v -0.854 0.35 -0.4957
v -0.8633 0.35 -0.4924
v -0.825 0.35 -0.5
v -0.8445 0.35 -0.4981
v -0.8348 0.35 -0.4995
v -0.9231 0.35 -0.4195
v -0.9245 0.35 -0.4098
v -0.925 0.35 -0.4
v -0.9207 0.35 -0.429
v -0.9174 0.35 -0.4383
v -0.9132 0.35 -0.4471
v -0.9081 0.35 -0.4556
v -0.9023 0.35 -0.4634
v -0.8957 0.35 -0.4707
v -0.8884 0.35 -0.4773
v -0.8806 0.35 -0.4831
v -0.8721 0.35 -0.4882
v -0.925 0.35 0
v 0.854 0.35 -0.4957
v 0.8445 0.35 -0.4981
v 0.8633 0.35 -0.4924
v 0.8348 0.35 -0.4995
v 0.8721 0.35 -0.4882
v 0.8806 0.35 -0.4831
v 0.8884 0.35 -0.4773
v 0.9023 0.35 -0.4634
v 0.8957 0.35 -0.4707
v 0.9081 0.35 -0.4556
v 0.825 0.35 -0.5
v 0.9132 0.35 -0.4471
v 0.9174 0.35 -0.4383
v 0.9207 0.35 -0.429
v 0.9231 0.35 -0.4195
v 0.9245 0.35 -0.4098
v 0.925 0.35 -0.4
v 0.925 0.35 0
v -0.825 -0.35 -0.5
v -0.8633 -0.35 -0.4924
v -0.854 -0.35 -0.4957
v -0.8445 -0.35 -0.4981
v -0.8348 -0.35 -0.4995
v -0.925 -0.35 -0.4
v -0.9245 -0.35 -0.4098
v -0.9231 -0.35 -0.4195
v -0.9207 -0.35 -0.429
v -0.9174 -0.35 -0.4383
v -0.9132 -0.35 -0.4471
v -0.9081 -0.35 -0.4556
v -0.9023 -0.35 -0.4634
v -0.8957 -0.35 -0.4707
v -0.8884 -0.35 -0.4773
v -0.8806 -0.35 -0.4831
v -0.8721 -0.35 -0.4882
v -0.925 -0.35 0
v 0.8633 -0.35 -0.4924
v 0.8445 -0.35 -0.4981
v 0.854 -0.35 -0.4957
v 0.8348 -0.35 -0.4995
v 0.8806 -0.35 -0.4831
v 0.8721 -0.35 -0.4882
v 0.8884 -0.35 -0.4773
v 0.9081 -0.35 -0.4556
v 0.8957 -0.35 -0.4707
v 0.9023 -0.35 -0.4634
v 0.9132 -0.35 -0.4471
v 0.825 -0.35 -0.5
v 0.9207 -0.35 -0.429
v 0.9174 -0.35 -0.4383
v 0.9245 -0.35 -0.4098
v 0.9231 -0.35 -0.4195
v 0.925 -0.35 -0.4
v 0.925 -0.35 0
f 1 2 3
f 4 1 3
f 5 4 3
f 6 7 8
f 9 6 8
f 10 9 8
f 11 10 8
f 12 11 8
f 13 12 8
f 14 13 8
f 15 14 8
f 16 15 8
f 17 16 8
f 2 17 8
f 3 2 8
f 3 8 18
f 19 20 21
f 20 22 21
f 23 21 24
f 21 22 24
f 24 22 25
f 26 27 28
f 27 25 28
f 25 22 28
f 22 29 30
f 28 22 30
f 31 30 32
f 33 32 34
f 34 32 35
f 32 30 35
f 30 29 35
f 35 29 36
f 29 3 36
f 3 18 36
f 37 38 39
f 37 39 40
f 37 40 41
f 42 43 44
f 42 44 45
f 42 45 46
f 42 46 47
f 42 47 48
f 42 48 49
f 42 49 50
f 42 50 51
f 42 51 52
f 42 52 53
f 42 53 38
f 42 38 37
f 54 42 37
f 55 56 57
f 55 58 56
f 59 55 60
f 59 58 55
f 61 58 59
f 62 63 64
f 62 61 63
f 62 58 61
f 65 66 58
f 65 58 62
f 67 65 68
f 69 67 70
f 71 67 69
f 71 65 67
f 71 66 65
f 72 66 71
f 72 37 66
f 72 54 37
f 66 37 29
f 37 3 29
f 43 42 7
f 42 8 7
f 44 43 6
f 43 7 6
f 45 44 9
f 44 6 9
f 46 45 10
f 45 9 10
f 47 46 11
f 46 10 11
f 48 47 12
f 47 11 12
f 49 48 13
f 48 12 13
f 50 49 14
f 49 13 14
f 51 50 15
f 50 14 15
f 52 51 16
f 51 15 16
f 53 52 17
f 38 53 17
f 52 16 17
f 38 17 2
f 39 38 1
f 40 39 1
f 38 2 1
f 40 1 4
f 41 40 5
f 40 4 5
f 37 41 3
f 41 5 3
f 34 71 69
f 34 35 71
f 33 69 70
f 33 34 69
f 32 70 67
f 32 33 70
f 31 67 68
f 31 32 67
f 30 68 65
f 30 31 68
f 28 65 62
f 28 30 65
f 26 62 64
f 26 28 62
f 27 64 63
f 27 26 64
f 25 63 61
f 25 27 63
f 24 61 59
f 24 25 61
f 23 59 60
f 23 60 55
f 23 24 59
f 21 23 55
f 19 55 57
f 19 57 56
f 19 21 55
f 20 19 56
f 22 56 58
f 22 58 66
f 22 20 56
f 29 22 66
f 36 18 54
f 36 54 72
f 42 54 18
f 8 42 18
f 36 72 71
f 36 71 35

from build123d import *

# Parameters (mm, degrees)
SKETCH_W  = 1.85
SKETCH_H  = 0.7
PAD_DEPTH = 0.5
FILLET_R  = 0.1


with BuildPart() as part:
    # Sketch → Pad (new body)
    with BuildSketch(Plane.XY):
        Rectangle(SKETCH_W, SKETCH_H)
    extrude(amount=-PAD_DEPTH)

    # Fillet
    fillet_edges = [part.edges().sort_by_distance(p)[0] for p in [
        (-0.925, 0, -0.5),
        (0.925, 0, -0.5),
    ]]
    fillet(fillet_edges, radius=FILLET_R)


solid = part.part
